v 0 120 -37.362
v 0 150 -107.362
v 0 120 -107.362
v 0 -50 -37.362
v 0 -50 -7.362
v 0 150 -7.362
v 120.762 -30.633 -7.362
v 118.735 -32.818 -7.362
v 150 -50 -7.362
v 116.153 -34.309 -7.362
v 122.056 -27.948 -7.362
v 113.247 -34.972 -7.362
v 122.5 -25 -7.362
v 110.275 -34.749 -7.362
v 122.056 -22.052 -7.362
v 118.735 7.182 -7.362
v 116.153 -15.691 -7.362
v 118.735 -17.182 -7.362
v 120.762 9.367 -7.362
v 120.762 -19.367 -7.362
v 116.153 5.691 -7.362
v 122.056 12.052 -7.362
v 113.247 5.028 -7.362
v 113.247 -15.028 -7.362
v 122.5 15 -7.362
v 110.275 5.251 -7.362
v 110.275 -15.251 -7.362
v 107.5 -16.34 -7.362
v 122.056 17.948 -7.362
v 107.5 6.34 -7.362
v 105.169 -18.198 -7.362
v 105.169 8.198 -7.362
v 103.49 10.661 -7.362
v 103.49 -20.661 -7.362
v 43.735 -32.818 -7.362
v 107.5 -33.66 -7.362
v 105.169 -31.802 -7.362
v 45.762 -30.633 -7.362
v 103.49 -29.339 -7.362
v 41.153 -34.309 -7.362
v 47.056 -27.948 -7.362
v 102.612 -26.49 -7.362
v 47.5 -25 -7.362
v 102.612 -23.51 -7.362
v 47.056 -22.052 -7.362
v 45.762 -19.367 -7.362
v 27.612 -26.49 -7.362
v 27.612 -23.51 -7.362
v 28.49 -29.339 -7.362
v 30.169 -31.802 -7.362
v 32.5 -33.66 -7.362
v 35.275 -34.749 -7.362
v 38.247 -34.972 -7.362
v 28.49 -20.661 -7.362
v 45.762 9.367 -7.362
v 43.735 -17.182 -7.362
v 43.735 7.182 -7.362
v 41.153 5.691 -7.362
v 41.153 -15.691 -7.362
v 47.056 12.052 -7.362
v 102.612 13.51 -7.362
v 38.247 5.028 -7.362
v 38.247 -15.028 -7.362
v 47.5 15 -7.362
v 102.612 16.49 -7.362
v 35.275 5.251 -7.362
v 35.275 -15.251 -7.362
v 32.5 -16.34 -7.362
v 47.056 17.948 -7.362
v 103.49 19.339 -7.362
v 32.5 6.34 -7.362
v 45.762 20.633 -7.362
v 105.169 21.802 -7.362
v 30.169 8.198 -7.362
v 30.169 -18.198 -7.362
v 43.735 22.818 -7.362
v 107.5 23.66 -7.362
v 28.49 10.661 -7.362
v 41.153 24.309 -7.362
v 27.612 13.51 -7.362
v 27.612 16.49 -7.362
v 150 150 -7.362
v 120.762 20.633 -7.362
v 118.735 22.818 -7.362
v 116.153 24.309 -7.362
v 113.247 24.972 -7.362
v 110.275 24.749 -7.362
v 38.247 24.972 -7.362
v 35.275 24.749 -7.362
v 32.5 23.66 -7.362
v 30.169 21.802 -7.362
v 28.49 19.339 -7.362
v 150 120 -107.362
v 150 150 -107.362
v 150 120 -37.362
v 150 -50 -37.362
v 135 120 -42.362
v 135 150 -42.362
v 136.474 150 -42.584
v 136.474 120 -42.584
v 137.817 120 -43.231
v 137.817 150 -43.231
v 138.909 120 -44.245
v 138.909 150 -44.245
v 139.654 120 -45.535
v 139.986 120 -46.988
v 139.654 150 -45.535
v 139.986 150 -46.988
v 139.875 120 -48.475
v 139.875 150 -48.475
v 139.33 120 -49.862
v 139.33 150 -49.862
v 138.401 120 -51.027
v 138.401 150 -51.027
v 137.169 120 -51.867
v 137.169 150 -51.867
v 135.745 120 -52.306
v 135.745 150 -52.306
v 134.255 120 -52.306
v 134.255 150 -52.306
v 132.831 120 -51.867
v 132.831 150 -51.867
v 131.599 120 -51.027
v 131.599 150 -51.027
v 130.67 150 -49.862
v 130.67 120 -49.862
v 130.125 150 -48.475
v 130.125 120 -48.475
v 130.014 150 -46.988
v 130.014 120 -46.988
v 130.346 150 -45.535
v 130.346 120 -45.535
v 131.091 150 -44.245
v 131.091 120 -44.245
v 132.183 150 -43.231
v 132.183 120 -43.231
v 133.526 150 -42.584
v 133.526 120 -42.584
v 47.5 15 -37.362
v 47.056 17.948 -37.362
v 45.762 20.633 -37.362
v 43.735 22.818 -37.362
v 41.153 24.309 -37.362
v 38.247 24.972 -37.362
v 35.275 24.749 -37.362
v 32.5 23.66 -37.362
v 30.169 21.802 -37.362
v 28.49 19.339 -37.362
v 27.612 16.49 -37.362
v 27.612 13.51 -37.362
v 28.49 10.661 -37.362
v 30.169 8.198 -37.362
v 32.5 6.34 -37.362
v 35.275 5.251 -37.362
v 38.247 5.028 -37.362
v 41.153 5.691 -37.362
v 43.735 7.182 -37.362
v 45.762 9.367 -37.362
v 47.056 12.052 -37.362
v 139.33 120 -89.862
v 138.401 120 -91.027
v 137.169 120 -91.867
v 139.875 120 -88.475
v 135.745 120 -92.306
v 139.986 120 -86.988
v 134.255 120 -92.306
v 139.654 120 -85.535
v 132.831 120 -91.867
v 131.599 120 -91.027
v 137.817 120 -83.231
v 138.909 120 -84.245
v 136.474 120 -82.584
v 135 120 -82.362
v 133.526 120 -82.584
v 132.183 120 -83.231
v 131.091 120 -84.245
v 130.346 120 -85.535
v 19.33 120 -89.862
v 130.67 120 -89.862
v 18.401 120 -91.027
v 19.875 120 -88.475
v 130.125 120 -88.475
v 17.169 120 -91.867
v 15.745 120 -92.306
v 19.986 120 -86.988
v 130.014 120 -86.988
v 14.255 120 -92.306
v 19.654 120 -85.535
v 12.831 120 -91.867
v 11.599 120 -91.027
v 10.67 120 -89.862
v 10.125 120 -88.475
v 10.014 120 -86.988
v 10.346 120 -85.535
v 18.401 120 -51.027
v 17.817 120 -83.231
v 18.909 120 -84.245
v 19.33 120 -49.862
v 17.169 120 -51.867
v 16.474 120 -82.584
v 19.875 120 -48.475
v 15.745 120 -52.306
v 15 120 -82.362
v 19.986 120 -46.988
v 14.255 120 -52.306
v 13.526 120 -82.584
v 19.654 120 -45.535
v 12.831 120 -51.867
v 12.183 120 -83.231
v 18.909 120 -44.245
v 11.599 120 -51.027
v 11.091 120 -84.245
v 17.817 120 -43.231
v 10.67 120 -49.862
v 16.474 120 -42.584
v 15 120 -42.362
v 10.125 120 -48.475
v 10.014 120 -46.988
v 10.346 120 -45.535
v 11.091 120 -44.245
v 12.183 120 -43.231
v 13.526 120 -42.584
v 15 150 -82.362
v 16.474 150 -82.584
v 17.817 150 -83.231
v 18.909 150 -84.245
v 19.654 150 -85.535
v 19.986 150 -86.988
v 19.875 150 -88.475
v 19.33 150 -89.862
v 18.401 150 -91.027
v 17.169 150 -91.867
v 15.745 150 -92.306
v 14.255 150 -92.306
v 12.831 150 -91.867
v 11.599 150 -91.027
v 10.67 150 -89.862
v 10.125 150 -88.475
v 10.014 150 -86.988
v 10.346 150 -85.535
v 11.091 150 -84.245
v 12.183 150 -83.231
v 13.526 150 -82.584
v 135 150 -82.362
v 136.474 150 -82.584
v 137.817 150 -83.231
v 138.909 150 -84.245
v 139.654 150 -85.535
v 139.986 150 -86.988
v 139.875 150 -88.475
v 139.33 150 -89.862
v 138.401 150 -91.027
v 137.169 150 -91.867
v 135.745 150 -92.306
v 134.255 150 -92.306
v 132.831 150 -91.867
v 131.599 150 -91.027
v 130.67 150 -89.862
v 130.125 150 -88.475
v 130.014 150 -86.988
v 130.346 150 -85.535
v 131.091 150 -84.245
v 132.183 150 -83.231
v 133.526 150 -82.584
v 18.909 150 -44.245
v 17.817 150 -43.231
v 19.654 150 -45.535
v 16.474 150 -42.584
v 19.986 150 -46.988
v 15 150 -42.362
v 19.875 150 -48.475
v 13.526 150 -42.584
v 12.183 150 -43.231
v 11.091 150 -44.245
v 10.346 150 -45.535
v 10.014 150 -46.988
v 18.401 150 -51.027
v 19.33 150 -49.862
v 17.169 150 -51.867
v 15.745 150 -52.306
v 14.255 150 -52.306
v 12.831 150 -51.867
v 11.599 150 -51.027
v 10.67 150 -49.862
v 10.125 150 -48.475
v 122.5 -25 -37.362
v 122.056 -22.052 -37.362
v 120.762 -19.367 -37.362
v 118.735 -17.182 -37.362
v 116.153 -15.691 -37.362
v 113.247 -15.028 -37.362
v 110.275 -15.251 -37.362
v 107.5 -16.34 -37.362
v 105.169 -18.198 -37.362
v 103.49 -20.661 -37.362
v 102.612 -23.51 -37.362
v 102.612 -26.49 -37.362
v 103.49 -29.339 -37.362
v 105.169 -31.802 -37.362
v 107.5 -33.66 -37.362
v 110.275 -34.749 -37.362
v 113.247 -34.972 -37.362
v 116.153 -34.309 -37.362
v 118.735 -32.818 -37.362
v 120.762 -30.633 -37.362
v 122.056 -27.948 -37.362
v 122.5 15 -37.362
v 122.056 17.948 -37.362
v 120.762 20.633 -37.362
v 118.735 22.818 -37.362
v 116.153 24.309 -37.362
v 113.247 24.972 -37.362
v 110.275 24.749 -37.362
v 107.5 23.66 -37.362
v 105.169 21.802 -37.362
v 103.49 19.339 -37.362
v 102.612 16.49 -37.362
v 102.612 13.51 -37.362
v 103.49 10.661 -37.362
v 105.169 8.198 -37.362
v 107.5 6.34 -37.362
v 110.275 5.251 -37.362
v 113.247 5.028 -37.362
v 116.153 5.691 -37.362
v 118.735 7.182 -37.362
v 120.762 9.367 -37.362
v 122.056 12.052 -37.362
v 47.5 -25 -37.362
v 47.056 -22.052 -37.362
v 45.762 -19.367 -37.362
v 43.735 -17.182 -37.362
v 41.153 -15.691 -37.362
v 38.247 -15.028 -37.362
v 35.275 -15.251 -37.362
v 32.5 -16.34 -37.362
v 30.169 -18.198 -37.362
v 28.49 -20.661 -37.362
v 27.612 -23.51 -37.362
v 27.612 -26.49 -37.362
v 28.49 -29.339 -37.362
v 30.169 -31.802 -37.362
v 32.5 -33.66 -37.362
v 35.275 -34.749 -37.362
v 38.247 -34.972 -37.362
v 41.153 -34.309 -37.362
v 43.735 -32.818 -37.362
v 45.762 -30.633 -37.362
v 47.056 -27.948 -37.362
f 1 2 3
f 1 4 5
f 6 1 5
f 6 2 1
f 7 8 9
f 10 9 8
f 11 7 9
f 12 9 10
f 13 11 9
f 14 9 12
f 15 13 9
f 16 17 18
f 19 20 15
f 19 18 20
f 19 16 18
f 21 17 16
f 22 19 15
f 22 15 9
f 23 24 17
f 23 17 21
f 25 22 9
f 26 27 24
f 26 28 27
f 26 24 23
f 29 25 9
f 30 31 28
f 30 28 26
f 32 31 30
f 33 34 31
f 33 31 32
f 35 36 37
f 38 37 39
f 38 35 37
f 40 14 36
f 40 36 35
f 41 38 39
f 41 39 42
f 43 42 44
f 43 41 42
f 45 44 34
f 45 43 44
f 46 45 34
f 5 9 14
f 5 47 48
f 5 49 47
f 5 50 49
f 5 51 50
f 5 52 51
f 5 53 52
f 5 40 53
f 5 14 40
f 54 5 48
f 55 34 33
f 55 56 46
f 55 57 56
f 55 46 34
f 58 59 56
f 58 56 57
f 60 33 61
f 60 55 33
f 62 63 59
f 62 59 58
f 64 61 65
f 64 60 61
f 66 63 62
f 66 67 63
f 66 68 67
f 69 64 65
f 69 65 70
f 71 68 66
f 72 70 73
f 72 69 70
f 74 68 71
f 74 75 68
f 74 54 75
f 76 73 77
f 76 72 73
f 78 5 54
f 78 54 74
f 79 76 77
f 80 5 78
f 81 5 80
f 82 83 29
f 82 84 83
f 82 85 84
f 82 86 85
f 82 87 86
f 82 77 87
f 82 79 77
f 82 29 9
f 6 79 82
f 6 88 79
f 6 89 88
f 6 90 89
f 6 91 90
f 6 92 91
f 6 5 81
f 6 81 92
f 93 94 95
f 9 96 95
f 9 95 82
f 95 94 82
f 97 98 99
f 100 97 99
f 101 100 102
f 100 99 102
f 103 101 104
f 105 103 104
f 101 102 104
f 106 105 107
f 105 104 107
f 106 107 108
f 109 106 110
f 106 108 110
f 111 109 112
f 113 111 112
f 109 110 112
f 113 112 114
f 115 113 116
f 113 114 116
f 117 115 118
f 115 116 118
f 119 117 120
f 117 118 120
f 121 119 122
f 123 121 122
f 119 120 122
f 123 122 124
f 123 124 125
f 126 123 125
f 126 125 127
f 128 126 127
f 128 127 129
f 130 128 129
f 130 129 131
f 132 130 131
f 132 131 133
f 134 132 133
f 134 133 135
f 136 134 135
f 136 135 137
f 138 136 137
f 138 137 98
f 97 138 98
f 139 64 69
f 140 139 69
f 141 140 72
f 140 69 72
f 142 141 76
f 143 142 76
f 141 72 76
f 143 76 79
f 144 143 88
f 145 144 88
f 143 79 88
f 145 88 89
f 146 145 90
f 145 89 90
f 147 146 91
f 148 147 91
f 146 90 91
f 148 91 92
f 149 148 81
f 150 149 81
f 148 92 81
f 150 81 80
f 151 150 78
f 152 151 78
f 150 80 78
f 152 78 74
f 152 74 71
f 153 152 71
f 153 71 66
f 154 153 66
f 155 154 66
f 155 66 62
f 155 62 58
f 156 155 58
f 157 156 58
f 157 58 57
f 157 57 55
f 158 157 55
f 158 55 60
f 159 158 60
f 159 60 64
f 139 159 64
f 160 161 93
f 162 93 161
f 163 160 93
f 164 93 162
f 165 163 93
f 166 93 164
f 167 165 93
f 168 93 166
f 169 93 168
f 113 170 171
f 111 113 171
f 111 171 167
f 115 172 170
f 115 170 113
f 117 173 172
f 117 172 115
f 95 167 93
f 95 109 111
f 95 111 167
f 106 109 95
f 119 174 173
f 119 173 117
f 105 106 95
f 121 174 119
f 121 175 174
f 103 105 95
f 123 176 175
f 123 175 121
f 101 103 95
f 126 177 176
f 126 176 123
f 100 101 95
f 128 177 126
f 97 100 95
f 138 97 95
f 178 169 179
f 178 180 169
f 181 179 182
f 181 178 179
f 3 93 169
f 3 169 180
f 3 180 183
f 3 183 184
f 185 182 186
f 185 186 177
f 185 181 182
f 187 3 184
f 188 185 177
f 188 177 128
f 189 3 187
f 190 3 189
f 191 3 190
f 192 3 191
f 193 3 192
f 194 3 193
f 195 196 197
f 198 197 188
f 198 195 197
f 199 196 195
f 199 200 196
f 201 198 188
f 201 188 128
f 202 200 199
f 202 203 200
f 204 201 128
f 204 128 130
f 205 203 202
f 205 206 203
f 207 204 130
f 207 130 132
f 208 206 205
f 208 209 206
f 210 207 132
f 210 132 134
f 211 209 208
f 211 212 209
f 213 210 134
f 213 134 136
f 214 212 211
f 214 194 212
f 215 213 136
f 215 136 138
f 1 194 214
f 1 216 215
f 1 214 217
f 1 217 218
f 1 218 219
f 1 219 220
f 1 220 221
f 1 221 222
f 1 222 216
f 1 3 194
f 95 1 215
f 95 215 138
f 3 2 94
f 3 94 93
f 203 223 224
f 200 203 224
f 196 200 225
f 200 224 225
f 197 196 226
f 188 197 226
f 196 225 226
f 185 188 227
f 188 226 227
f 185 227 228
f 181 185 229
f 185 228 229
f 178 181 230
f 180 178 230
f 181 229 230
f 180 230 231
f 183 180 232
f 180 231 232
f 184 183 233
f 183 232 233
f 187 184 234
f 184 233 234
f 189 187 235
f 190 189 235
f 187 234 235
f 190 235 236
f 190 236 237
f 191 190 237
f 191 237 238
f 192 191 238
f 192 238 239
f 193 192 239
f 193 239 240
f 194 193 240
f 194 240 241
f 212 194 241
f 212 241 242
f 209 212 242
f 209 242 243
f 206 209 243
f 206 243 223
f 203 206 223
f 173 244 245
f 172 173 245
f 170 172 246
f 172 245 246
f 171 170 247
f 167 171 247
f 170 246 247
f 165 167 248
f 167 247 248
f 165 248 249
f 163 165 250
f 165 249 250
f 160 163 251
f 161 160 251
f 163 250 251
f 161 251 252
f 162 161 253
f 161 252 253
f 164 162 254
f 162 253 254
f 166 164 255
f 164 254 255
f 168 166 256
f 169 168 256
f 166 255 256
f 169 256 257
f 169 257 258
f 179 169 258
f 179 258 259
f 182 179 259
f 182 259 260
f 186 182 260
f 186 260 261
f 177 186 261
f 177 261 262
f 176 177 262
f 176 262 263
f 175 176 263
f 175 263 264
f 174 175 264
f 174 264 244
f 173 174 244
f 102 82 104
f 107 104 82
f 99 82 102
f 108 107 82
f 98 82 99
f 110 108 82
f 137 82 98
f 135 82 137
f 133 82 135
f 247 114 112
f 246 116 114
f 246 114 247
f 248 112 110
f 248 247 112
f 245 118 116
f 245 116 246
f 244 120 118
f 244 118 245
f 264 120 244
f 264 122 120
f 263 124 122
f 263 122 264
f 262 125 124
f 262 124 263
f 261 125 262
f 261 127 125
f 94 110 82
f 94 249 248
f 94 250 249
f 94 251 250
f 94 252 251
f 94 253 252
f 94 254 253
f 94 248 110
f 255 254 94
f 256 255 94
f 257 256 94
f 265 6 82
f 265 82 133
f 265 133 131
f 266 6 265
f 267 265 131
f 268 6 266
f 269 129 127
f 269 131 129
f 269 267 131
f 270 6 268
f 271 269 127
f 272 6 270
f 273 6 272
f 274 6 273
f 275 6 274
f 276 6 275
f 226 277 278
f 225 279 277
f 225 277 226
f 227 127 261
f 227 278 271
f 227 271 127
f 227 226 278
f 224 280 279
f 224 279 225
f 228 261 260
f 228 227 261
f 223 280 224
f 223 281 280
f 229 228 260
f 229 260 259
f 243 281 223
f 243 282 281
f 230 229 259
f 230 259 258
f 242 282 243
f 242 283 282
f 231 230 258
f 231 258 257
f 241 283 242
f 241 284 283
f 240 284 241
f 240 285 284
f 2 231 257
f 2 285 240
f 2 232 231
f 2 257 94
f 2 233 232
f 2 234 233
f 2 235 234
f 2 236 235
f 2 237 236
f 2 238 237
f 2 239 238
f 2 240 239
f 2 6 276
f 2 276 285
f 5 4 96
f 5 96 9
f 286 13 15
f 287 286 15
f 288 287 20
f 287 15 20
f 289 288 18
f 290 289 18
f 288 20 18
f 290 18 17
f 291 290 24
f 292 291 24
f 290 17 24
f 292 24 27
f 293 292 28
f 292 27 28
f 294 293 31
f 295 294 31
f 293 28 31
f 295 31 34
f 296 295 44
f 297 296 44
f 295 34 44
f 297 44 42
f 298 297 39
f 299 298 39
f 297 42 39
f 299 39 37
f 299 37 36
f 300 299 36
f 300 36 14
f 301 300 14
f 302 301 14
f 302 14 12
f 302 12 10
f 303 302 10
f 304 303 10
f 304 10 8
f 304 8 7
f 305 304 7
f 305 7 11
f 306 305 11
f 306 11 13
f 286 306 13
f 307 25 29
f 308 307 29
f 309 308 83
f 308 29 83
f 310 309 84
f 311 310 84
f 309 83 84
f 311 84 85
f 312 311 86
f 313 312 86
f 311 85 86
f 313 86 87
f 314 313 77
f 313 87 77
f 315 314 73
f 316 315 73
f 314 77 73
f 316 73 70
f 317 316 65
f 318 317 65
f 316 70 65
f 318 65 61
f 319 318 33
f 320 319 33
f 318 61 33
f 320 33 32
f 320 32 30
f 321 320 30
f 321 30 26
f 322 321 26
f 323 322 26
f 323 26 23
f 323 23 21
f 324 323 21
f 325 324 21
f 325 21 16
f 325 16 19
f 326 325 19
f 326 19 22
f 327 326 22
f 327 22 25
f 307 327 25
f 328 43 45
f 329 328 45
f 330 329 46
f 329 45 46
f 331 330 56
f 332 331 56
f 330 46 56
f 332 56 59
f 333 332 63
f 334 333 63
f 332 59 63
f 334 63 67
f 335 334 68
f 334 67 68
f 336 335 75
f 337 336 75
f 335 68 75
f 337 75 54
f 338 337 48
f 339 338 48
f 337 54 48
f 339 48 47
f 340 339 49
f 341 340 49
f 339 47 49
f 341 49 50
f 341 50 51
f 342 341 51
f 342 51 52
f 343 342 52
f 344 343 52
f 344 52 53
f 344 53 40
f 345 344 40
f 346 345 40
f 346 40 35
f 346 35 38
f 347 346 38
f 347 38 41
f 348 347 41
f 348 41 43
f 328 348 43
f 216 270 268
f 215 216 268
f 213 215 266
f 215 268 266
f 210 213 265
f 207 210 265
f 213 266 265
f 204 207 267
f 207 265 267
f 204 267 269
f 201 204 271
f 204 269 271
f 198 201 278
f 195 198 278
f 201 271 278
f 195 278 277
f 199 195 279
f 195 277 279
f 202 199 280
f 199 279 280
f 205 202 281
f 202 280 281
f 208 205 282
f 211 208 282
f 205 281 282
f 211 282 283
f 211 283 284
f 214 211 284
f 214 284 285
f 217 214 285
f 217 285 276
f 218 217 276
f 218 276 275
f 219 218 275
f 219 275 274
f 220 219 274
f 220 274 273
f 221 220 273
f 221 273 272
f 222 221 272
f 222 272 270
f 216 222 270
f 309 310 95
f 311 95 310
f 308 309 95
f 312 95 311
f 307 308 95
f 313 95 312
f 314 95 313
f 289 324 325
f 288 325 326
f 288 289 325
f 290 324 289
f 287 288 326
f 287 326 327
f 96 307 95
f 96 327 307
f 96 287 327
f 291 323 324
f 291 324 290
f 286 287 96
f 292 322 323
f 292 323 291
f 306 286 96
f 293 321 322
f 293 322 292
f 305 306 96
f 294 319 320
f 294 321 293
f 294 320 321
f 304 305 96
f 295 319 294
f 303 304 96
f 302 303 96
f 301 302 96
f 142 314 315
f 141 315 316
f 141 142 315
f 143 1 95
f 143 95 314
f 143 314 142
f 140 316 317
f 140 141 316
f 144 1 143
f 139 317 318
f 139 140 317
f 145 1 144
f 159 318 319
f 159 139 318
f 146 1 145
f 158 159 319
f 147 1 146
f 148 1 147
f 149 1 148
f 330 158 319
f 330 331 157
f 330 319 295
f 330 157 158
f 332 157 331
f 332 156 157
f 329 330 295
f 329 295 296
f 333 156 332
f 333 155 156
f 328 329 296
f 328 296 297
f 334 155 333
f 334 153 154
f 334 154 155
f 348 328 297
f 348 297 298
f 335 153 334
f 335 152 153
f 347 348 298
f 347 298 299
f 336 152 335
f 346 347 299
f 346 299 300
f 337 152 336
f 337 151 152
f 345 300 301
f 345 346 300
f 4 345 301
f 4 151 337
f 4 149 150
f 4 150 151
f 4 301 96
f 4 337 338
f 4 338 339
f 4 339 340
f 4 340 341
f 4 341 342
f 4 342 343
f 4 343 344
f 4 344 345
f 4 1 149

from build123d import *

# Parameters (mm, degrees)
BOSS_EXTRUDE1_DEPTH = 150
SKETCH2_R           = 10
CUT_EXTRUDE1_DEPTH  = 150
SKETCH3_R           = 5
CUT_EXTRUDE2_DEPTH  = 273.07833604


with BuildPart() as part:
    # Sketch1 → Boss-Extrude1 (new body)
    with BuildSketch(Plane(origin=(0, 0, 0), x_dir=(0, 0, -1), z_dir=(1, 0, 0))):
        Polygon((7.362101983, -50), (7.362101983, 150), (107.362101983, 150), (107.362101983, 120), (37.362101983, 120), (37.362101983, -50), align=None)
    extrude(amount=BOSS_EXTRUDE1_DEPTH)

    # Sketch2 → Cut-Extrude1 (cut)
    with BuildSketch(Plane.XY.offset(-7.362101983)):
        with Locations((37.5, -25)):
            Circle(SKETCH2_R)
        with Locations((37.5, 15)):
            Circle(SKETCH2_R)
        with Locations((112.5, -25)):
            Circle(SKETCH2_R)
        with Locations((112.5, 15)):
            Circle(SKETCH2_R)
    extrude(amount=-CUT_EXTRUDE1_DEPTH, mode=Mode.SUBTRACT)

    # Sketch3 → Cut-Extrude2 (cut, through all)
    with BuildSketch(Plane(origin=(0, 150, 0), x_dir=(1, 0, 0), z_dir=(0, 1, 0))):
        with Locations(Location((15, 87.362101983, 0), (0, 0, 270))):
            Circle(SKETCH3_R)
        with Locations(Location((15, 47.362101983, 0), (0, 0, 270))):
            Circle(SKETCH3_R)
        with Locations(Location((135, 47.362101983, 0), (0, 0, 270))):
            Circle(SKETCH3_R)
        with Locations(Location((135, 87.362101983, 0), (0, 0, 270))):
            Circle(SKETCH3_R)
    extrude(amount=-CUT_EXTRUDE2_DEPTH, mode=Mode.SUBTRACT)


solid = part.part
